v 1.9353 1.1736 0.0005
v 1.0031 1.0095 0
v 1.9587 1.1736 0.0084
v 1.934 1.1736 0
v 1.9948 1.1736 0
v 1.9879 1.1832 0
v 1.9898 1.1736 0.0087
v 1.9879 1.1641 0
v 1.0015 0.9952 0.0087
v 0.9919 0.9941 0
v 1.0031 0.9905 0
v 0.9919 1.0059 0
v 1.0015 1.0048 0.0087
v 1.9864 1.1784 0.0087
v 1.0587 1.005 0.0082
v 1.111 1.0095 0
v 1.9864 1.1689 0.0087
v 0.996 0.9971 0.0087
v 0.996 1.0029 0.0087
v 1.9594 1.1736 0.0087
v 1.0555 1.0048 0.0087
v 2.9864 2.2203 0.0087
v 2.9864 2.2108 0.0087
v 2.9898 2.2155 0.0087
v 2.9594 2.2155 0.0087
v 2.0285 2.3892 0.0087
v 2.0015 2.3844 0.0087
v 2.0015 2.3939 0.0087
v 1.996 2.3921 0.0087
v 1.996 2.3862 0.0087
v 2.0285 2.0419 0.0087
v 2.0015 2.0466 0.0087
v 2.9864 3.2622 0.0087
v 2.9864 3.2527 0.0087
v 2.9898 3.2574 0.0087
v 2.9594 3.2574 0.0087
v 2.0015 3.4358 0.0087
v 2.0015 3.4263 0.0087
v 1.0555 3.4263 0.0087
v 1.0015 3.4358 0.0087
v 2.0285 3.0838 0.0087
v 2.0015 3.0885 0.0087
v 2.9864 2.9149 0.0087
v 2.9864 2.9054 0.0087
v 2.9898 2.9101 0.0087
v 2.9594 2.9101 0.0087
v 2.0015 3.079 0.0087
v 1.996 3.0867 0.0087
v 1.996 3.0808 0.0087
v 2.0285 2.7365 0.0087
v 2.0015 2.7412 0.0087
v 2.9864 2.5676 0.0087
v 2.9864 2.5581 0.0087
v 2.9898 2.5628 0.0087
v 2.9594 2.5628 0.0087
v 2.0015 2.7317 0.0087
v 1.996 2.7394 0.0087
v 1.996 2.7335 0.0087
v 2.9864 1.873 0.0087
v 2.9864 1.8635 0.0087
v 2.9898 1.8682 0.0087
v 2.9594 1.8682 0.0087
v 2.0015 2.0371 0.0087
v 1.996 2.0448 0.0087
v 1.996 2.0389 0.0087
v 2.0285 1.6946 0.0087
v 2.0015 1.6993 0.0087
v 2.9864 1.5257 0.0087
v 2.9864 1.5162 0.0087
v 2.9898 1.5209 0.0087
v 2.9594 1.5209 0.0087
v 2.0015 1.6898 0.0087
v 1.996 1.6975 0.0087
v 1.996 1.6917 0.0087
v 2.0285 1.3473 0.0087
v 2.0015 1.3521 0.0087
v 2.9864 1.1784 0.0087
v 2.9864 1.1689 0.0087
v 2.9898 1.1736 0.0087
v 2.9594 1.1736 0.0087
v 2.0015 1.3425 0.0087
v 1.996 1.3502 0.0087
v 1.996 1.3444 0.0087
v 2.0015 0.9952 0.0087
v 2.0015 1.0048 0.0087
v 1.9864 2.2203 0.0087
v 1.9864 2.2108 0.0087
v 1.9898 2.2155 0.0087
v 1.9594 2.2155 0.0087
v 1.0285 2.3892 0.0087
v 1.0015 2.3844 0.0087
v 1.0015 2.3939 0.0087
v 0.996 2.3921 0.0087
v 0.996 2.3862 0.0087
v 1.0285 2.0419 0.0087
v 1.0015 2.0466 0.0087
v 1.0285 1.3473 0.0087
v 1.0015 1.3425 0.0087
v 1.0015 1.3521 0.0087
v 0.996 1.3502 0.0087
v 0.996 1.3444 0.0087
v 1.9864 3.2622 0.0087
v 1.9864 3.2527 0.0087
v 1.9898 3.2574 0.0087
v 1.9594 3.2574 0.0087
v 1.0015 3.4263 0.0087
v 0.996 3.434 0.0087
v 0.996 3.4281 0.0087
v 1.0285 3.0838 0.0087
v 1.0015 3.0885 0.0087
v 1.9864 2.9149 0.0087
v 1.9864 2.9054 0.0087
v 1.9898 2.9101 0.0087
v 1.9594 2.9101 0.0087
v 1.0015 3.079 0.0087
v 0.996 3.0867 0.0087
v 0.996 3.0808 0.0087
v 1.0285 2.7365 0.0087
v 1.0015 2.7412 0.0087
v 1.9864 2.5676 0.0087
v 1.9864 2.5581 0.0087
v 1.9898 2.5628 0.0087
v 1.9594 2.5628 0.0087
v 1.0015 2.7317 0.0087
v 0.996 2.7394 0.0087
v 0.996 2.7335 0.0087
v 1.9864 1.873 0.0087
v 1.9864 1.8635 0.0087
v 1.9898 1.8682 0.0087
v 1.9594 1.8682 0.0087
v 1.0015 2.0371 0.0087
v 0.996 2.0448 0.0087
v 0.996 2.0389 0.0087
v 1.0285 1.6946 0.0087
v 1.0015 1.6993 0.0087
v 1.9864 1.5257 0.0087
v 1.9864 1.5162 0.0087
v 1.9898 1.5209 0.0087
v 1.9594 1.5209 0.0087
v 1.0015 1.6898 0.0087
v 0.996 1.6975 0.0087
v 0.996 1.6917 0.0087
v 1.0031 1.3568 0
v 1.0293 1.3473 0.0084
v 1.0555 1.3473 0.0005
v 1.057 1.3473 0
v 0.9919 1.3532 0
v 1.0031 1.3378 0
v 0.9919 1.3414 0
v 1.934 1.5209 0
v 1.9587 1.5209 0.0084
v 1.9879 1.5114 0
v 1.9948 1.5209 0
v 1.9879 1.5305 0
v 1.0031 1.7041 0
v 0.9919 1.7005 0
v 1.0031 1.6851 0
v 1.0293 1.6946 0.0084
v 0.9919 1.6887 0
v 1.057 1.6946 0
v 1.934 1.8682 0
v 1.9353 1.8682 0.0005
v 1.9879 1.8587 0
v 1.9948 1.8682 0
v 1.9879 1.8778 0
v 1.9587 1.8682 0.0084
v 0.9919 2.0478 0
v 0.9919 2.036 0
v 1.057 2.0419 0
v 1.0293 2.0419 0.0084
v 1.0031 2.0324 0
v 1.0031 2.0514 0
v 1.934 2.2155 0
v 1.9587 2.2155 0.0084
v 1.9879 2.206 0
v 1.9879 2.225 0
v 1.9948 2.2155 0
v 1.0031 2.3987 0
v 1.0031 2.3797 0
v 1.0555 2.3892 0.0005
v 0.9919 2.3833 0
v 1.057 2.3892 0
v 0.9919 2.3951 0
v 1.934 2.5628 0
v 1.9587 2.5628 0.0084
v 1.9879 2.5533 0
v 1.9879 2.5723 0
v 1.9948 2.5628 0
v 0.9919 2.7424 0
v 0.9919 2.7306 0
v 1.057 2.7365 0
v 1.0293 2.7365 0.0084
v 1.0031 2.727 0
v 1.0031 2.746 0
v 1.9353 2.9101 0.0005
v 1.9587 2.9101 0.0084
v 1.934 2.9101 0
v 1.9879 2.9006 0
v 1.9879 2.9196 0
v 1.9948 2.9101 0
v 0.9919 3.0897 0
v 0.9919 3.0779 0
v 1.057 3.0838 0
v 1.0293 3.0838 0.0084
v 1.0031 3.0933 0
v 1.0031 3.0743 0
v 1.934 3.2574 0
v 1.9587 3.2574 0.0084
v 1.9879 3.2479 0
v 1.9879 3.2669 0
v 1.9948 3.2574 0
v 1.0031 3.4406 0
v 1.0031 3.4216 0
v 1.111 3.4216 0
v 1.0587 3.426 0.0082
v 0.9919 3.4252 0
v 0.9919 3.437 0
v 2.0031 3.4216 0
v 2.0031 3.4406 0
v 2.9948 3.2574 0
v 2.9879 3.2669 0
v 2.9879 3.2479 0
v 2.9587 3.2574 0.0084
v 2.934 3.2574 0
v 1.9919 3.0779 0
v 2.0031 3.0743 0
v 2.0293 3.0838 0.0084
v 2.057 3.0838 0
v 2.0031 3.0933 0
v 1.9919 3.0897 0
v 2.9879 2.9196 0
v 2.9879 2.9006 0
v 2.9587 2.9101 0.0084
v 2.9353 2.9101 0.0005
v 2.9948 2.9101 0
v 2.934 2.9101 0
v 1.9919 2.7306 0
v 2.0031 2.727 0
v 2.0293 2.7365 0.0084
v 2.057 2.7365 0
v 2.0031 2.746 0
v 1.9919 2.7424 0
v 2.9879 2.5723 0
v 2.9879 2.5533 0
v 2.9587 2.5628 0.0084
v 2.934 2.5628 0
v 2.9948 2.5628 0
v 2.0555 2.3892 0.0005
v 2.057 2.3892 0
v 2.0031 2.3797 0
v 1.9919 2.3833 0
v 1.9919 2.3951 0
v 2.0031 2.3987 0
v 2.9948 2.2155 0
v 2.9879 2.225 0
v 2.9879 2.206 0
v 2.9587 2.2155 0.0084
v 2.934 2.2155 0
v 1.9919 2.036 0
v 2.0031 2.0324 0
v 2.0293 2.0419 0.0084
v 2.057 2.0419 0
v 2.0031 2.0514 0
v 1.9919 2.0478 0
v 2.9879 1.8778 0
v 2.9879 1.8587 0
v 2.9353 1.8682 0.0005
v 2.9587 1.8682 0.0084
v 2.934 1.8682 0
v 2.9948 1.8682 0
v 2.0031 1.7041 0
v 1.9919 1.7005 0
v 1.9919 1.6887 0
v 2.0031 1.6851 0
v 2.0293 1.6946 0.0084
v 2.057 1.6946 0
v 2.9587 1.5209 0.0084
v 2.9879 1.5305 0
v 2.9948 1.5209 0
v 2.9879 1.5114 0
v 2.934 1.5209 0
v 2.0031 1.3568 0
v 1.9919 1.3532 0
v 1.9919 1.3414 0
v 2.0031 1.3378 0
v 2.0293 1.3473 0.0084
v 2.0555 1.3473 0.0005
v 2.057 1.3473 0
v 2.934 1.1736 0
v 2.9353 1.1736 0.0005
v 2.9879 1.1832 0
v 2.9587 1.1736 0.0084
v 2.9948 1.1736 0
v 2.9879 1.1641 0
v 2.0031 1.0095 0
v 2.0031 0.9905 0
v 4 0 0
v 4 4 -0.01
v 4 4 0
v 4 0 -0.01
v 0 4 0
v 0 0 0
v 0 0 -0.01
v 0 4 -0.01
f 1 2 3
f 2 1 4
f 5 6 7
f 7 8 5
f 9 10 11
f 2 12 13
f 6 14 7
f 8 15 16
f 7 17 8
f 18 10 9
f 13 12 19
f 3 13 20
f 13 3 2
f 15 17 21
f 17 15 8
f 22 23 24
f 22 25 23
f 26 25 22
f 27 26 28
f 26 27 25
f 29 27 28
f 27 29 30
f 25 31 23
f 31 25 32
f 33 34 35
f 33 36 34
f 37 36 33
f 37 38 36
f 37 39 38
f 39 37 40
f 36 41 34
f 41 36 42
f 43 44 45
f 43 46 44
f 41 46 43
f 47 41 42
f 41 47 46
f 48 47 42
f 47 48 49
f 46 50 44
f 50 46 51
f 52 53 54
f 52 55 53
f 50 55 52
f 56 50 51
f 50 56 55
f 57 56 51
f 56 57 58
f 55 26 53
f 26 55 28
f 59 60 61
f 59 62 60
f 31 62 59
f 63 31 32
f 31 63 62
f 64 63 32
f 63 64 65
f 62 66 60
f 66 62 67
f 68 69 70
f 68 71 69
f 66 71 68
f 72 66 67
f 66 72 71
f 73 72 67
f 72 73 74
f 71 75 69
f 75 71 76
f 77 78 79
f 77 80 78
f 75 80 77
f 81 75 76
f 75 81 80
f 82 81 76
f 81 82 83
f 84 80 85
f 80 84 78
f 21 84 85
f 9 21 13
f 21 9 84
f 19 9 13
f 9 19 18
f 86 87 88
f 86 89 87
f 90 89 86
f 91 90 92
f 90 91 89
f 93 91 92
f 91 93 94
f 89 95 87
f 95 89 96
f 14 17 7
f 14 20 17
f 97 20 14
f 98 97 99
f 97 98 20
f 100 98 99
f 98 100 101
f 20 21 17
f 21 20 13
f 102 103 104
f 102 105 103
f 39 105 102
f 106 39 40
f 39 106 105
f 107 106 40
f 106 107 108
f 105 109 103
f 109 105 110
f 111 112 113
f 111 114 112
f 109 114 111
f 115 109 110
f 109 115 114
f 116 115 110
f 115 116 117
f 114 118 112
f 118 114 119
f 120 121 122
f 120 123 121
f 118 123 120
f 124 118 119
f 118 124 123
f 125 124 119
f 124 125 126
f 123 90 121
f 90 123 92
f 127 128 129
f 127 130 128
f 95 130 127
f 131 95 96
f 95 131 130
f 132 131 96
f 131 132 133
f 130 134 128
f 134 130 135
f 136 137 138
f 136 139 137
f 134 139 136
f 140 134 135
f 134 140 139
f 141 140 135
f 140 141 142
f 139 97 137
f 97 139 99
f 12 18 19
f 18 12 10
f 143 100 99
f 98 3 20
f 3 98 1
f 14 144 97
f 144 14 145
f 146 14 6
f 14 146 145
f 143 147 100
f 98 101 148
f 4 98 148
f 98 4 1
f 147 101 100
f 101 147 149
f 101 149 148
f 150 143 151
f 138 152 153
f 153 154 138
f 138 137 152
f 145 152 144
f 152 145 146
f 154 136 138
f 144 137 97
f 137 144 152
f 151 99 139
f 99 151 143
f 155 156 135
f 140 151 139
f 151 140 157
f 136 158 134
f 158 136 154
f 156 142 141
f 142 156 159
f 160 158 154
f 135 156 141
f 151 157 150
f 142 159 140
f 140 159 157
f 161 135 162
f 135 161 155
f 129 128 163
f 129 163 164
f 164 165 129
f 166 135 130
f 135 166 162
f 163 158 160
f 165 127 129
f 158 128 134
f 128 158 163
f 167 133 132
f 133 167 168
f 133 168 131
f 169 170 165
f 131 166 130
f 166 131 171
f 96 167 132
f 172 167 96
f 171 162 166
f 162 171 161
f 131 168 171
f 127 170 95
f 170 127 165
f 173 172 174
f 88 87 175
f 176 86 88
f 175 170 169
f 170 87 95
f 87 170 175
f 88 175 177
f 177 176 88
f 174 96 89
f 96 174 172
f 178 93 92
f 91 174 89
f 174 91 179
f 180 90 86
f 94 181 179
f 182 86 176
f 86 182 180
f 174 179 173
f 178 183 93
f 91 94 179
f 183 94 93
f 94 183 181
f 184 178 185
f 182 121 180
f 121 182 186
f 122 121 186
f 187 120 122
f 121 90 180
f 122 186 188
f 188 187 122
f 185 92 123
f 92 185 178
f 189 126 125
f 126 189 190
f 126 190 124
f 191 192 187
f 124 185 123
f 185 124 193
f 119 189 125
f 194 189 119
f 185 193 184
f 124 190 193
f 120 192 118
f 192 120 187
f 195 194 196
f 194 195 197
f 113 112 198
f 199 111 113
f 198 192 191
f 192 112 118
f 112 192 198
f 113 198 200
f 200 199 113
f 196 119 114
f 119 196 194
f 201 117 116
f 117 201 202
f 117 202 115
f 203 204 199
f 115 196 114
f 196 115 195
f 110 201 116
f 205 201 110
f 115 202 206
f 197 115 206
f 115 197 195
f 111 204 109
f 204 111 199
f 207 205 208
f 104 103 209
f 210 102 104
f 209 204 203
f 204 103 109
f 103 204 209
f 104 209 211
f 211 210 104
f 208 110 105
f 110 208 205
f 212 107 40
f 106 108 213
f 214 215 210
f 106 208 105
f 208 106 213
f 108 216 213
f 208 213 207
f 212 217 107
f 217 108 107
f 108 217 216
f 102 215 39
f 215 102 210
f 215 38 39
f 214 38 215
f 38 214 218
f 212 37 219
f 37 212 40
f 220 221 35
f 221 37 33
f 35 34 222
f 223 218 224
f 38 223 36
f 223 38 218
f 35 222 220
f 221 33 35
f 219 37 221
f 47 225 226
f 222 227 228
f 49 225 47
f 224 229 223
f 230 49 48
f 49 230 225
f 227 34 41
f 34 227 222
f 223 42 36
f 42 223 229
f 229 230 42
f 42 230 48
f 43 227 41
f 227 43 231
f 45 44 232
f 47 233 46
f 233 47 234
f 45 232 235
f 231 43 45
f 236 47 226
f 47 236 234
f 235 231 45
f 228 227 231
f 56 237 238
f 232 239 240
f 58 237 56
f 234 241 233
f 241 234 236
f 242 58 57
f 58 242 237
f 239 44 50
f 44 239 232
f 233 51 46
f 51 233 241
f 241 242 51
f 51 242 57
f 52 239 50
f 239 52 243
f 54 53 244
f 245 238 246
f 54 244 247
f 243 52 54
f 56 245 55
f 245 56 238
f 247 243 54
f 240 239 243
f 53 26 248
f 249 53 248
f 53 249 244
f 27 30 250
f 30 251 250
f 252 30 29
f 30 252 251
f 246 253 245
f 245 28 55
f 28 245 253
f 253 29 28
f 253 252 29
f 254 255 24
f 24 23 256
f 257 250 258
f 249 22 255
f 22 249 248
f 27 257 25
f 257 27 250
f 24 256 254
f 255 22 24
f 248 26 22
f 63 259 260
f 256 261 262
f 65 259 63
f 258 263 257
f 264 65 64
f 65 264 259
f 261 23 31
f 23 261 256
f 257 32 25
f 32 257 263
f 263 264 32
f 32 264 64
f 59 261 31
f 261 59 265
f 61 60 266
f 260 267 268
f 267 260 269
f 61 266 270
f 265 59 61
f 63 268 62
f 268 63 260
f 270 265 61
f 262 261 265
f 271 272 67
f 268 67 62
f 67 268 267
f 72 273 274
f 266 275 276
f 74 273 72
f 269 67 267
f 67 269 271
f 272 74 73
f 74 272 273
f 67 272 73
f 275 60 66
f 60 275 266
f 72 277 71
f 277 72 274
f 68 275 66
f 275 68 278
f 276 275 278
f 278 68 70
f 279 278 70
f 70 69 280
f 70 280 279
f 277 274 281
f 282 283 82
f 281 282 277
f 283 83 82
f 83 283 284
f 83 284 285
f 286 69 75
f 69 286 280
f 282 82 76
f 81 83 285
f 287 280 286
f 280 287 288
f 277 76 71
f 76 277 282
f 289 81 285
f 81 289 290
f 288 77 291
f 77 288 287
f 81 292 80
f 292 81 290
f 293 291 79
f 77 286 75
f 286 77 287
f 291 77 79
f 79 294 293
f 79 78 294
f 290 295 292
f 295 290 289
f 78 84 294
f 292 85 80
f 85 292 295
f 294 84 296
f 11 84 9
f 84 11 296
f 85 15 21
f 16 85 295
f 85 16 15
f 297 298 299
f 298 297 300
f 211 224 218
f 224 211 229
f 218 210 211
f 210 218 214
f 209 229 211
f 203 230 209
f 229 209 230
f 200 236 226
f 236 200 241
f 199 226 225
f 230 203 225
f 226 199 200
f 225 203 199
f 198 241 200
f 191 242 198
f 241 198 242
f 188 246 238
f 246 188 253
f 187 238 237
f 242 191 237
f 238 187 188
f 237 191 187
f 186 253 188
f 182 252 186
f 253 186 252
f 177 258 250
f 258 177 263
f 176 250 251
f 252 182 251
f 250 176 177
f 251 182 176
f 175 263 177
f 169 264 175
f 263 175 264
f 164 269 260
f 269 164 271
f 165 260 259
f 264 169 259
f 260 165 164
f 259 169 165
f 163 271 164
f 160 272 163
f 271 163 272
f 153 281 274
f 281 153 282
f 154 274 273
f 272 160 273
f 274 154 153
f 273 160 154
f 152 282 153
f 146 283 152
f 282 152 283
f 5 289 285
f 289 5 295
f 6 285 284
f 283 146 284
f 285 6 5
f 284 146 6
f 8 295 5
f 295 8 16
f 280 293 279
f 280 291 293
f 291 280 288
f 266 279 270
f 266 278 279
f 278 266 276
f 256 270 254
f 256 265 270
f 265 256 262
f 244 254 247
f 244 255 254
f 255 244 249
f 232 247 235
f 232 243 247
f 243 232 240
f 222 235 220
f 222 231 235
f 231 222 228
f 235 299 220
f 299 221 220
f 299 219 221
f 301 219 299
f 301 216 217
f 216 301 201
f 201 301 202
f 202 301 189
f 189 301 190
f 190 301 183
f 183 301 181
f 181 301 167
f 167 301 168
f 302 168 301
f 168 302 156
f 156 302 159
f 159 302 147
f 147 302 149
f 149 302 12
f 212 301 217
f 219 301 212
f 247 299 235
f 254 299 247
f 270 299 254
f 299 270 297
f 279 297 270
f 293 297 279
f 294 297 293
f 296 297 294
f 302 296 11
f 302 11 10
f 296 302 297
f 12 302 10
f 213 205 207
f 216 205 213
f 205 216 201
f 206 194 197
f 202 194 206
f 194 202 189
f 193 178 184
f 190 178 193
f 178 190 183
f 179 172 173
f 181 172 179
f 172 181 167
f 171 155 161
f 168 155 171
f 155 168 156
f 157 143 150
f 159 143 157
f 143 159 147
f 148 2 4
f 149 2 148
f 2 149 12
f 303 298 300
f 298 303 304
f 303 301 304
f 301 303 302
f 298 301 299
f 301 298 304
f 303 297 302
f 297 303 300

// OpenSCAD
hull(){
    translate([1.0, 1.0]) sphere(0.01);
    translate([1.984807753, 1.173648178]) sphere(0.01);
}
hull(){
    translate([1.984807753, 1.173648178]) sphere(0.01);
    translate([1.0, 1.347296356]) sphere(0.01);
}
hull(){
    translate([1.0, 1.347296356]) sphere(0.01);
    translate([1.984807753, 1.520944534]) sphere(0.01);
}
hull(){
    translate([1.984807753, 1.520944534]) sphere(0.01);
    translate([1.0, 1.694592712]) sphere(0.01);
}
hull(){
    translate([1.0, 1.694592712]) sphere(0.01);
    translate([1.984807753, 1.86824089]) sphere(0.01);
}
hull(){
    translate([1.984807753, 1.86824089]) sphere(0.01);
    translate([1.0, 2.041889068]) sphere(0.01);
}
hull(){
    translate([1.0, 2.041889068]) sphere(0.01);
    translate([1.984807753, 2.215537246]) sphere(0.01);
}
hull(){
    translate([1.984807753, 2.215537246]) sphere(0.01);
    translate([1.0, 2.389185424]) sphere(0.01);
}
hull(){
    translate([1.0, 2.389185424]) sphere(0.01);
    translate([1.984807753, 2.562833602]) sphere(0.01);
}
hull(){
    translate([1.984807753, 2.562833602]) sphere(0.01);
    translate([1.0, 2.73648178]) sphere(0.01);
}
hull(){
    translate([1.0, 2.73648178]) sphere(0.01);
    translate([1.984807753, 2.910129958]) sphere(0.01);
}
hull(){
    translate([1.984807753, 2.910129958]) sphere(0.01);
    translate([1.0, 3.083778136]) sphere(0.01);
}
hull(){
    translate([1.0, 3.083778136]) sphere(0.01);
    translate([1.984807753, 3.257426314]) sphere(0.01);
}
hull(){
    translate([1.984807753, 3.257426314]) sphere(0.01);
    translate([1.0, 3.431074492]) sphere(0.01);
}
hull(){
    translate([1.0, 3.431074492]) sphere(0.01);
    translate([2.0, 3.431074492]) sphere(0.01);
}
hull(){
    translate([2.0, 3.431074492]) sphere(0.01);
    translate([2.984807753, 3.257426314]) sphere(0.01);
}
hull(){
    translate([2.984807753, 3.257426314]) sphere(0.01);
    translate([2.0, 3.083778136]) sphere(0.01);
}
hull(){
    translate([2.0, 3.083778136]) sphere(0.01);
    translate([2.984807753, 2.910129958]) sphere(0.01);
}
hull(){
    translate([2.984807753, 2.910129958]) sphere(0.01);
    translate([2.0, 2.73648178]) sphere(0.01);
}
hull(){
    translate([2.0, 2.73648178]) sphere(0.01);
    translate([2.984807753, 2.562833602]) sphere(0.01);
}
hull(){
    translate([2.984807753, 2.562833602]) sphere(0.01);
    translate([2.0, 2.389185424]) sphere(0.01);
}
hull(){
    translate([2.0, 2.389185424]) sphere(0.01);
    translate([2.984807753, 2.215537246]) sphere(0.01);
}
hull(){
    translate([2.984807753, 2.215537246]) sphere(0.01);
    translate([2.0, 2.041889068]) sphere(0.01);
}
hull(){
    translate([2.0, 2.041889068]) sphere(0.01);
    translate([2.984807753, 1.86824089]) sphere(0.01);
}
hull(){
    translate([2.984807753, 1.86824089]) sphere(0.01);
    translate([2.0, 1.694592712]) sphere(0.01);
}
hull(){
    translate([2.0, 1.694592712]) sphere(0.01);
    translate([2.984807753, 1.520944534]) sphere(0.01);
}
hull(){
    translate([2.984807753, 1.520944534]) sphere(0.01);
    translate([2.0, 1.347296356]) sphere(0.01);
}
hull(){
    translate([2.0, 1.347296356]) sphere(0.01);
    translate([2.984807753, 1.173648178]) sphere(0.01);
}
hull(){
    translate([2.984807753, 1.173648178]) sphere(0.01);
    translate([2.0, 1.0]) sphere(0.01);
}
hull(){
    translate([2.0, 1.0]) sphere(0.01);
    translate([1.0, 1.0]) sphere(0.01);
}
translate([0,0,-0.01]) color([0.1,0.1,0.1]) cube([4,4,0.01]);
